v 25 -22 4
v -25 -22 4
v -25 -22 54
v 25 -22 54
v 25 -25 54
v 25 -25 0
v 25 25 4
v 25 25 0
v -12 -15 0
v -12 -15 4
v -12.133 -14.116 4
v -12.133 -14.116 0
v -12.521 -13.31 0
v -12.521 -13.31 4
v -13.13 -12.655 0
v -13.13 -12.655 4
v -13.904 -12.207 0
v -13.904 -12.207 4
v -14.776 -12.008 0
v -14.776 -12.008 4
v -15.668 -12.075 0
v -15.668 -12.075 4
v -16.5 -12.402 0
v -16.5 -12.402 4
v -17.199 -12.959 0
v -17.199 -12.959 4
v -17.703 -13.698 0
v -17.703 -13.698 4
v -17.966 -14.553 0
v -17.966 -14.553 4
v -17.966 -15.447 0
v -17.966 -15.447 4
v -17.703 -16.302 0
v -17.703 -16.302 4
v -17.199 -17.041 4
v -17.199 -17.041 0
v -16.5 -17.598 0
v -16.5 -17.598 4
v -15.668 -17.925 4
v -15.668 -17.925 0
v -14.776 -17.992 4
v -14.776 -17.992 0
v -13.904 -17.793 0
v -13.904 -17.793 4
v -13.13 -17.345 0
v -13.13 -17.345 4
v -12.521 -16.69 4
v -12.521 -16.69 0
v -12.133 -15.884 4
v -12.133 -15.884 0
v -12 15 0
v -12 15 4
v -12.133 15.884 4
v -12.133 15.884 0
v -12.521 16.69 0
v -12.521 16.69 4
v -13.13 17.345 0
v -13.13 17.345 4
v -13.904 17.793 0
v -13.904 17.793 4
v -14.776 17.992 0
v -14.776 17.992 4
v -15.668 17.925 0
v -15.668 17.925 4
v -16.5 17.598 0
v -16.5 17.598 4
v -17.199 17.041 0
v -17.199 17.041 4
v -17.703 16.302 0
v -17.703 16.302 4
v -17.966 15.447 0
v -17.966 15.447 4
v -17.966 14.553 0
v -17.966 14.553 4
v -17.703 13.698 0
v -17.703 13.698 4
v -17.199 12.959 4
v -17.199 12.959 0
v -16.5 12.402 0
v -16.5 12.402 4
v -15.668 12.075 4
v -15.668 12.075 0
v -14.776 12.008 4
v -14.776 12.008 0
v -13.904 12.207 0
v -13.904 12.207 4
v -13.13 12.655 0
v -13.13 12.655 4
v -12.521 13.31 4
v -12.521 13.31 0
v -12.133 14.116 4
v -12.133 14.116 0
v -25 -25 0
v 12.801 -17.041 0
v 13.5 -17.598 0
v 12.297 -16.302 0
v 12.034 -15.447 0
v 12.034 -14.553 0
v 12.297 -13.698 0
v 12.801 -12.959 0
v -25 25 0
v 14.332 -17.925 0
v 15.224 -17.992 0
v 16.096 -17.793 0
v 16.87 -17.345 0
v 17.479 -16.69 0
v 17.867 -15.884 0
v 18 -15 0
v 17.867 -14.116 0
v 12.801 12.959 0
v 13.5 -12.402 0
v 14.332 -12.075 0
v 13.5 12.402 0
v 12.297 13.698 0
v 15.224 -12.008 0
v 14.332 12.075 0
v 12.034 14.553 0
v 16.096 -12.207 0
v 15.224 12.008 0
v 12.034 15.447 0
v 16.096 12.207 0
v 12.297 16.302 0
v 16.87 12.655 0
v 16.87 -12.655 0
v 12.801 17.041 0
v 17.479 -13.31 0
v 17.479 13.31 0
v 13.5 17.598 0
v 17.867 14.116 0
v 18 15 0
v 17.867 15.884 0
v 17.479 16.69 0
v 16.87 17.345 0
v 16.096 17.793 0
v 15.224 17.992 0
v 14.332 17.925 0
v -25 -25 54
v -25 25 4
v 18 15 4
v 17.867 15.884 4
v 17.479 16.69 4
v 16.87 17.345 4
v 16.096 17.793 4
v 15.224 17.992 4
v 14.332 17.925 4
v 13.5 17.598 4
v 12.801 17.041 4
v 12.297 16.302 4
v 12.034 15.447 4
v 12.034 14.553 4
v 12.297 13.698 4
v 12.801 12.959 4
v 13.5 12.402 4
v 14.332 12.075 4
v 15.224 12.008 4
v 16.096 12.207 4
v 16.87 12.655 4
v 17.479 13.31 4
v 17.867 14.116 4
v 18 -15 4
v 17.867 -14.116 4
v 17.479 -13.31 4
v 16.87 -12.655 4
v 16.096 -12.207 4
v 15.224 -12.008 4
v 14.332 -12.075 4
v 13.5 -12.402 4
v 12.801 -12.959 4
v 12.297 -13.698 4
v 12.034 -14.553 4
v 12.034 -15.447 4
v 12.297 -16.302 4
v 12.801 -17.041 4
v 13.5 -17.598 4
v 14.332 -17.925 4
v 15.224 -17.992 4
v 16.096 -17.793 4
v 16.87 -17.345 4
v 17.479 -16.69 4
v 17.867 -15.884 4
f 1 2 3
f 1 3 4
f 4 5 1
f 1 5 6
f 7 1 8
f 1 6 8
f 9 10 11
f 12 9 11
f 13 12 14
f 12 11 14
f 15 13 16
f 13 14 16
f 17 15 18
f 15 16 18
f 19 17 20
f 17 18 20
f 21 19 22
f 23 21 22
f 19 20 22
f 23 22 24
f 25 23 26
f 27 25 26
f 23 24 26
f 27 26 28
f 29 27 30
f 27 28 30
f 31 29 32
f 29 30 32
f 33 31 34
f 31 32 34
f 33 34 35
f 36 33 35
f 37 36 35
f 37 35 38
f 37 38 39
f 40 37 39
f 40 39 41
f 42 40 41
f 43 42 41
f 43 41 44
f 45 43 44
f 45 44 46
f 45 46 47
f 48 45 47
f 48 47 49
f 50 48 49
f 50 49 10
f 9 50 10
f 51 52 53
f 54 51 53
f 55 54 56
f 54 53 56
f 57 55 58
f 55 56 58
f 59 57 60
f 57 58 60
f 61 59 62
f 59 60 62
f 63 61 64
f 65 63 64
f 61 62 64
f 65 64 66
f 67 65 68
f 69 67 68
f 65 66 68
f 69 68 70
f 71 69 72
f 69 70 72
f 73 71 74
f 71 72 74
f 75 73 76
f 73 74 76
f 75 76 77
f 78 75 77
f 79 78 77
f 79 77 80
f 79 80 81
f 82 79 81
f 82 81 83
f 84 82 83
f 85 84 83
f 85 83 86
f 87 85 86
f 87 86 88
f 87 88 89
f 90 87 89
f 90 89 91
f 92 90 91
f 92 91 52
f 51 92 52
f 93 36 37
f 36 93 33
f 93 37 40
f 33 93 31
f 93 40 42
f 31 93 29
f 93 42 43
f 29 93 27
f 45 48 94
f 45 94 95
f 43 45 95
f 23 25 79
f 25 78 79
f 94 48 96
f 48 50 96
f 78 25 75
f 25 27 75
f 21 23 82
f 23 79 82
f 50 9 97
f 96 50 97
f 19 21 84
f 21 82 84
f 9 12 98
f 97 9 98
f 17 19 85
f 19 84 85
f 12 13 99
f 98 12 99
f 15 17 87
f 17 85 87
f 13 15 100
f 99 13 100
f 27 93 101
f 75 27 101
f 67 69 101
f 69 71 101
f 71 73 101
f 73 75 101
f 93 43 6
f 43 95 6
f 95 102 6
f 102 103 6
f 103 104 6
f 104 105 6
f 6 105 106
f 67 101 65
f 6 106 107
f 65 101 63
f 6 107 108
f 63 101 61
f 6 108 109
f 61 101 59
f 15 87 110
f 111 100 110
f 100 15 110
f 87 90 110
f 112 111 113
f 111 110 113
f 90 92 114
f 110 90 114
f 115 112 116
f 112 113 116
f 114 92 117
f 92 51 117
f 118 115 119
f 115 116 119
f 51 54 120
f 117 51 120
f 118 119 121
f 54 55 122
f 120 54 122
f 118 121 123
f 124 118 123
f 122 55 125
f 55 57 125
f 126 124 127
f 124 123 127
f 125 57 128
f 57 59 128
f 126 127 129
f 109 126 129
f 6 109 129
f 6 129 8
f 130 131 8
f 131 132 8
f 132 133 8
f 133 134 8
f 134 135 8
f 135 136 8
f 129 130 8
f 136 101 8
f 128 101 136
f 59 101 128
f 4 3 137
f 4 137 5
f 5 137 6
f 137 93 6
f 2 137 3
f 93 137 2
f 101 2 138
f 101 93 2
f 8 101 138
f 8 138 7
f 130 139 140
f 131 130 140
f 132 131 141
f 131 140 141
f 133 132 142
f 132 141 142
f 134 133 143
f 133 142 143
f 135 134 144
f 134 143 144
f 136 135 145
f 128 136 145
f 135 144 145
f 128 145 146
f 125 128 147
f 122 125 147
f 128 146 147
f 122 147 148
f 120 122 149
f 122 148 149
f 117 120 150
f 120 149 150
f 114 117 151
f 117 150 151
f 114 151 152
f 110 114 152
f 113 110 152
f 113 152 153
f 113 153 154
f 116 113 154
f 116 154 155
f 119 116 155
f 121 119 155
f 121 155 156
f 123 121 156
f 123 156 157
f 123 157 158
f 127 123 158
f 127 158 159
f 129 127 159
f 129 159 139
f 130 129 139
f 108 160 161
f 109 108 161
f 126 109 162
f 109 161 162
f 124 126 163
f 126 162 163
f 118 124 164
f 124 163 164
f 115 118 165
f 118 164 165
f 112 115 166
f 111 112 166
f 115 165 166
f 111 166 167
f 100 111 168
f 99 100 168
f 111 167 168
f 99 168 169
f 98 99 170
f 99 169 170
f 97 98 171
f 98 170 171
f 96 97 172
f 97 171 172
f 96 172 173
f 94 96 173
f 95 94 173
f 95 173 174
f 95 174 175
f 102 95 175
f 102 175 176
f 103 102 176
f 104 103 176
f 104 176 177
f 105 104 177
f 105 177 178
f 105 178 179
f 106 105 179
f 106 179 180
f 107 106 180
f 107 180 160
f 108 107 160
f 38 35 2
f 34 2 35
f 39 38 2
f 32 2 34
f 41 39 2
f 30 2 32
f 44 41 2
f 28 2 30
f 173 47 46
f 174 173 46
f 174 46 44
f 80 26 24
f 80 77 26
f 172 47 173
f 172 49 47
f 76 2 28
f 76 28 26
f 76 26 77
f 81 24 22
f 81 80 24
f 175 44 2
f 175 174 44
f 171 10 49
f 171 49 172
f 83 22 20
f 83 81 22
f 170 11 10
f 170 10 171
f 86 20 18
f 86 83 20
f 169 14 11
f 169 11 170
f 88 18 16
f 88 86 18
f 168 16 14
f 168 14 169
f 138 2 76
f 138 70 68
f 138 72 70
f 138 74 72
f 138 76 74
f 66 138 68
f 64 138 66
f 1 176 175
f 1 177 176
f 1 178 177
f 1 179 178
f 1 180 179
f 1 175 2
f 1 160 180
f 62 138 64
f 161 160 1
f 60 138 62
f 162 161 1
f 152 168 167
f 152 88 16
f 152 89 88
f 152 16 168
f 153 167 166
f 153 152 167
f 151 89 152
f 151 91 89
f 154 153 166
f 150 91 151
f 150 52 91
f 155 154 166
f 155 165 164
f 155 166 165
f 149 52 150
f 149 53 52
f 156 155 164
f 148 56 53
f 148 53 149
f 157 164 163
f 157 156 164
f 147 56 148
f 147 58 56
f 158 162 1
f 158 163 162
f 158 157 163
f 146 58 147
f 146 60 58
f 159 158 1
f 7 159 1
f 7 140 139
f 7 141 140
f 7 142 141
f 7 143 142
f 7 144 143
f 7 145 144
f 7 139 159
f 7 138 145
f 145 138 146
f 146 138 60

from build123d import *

# Parameters (mm, degrees)
F0_W     = 50
F0_H     = 50
F1_DEPTH = 4
F2_W     = 50
F2_H     = 3
F3_DEPTH = 50
F4_R     = 3
F5_DEPTH = 25


with BuildPart() as f1:
    # F0 (on Top) → F1 (new body)
    with BuildSketch(Plane.XY):
        Rectangle(F0_W, F0_H)
    extrude(amount=F1_DEPTH)

    # F2 (on face) → F3 (join)
    with BuildSketch(Plane.XY.offset(4)):
        with Locations((0, -23.5)):
            Rectangle(F2_W, F2_H)
    extrude(amount=F3_DEPTH)

    # F4 (on face) → F5 (cut)
    with BuildSketch(Plane.XY.offset(4)):
        with Locations((-15, 15)):
            Circle(F4_R)
        with Locations((-15, -15)):
            Circle(F4_R)
        with Locations((15, -15)):
            Circle(F4_R)
        with Locations((15, 15)):
            Circle(F4_R)
    extrude(amount=-F5_DEPTH, mode=Mode.SUBTRACT)


solid = f1.part
